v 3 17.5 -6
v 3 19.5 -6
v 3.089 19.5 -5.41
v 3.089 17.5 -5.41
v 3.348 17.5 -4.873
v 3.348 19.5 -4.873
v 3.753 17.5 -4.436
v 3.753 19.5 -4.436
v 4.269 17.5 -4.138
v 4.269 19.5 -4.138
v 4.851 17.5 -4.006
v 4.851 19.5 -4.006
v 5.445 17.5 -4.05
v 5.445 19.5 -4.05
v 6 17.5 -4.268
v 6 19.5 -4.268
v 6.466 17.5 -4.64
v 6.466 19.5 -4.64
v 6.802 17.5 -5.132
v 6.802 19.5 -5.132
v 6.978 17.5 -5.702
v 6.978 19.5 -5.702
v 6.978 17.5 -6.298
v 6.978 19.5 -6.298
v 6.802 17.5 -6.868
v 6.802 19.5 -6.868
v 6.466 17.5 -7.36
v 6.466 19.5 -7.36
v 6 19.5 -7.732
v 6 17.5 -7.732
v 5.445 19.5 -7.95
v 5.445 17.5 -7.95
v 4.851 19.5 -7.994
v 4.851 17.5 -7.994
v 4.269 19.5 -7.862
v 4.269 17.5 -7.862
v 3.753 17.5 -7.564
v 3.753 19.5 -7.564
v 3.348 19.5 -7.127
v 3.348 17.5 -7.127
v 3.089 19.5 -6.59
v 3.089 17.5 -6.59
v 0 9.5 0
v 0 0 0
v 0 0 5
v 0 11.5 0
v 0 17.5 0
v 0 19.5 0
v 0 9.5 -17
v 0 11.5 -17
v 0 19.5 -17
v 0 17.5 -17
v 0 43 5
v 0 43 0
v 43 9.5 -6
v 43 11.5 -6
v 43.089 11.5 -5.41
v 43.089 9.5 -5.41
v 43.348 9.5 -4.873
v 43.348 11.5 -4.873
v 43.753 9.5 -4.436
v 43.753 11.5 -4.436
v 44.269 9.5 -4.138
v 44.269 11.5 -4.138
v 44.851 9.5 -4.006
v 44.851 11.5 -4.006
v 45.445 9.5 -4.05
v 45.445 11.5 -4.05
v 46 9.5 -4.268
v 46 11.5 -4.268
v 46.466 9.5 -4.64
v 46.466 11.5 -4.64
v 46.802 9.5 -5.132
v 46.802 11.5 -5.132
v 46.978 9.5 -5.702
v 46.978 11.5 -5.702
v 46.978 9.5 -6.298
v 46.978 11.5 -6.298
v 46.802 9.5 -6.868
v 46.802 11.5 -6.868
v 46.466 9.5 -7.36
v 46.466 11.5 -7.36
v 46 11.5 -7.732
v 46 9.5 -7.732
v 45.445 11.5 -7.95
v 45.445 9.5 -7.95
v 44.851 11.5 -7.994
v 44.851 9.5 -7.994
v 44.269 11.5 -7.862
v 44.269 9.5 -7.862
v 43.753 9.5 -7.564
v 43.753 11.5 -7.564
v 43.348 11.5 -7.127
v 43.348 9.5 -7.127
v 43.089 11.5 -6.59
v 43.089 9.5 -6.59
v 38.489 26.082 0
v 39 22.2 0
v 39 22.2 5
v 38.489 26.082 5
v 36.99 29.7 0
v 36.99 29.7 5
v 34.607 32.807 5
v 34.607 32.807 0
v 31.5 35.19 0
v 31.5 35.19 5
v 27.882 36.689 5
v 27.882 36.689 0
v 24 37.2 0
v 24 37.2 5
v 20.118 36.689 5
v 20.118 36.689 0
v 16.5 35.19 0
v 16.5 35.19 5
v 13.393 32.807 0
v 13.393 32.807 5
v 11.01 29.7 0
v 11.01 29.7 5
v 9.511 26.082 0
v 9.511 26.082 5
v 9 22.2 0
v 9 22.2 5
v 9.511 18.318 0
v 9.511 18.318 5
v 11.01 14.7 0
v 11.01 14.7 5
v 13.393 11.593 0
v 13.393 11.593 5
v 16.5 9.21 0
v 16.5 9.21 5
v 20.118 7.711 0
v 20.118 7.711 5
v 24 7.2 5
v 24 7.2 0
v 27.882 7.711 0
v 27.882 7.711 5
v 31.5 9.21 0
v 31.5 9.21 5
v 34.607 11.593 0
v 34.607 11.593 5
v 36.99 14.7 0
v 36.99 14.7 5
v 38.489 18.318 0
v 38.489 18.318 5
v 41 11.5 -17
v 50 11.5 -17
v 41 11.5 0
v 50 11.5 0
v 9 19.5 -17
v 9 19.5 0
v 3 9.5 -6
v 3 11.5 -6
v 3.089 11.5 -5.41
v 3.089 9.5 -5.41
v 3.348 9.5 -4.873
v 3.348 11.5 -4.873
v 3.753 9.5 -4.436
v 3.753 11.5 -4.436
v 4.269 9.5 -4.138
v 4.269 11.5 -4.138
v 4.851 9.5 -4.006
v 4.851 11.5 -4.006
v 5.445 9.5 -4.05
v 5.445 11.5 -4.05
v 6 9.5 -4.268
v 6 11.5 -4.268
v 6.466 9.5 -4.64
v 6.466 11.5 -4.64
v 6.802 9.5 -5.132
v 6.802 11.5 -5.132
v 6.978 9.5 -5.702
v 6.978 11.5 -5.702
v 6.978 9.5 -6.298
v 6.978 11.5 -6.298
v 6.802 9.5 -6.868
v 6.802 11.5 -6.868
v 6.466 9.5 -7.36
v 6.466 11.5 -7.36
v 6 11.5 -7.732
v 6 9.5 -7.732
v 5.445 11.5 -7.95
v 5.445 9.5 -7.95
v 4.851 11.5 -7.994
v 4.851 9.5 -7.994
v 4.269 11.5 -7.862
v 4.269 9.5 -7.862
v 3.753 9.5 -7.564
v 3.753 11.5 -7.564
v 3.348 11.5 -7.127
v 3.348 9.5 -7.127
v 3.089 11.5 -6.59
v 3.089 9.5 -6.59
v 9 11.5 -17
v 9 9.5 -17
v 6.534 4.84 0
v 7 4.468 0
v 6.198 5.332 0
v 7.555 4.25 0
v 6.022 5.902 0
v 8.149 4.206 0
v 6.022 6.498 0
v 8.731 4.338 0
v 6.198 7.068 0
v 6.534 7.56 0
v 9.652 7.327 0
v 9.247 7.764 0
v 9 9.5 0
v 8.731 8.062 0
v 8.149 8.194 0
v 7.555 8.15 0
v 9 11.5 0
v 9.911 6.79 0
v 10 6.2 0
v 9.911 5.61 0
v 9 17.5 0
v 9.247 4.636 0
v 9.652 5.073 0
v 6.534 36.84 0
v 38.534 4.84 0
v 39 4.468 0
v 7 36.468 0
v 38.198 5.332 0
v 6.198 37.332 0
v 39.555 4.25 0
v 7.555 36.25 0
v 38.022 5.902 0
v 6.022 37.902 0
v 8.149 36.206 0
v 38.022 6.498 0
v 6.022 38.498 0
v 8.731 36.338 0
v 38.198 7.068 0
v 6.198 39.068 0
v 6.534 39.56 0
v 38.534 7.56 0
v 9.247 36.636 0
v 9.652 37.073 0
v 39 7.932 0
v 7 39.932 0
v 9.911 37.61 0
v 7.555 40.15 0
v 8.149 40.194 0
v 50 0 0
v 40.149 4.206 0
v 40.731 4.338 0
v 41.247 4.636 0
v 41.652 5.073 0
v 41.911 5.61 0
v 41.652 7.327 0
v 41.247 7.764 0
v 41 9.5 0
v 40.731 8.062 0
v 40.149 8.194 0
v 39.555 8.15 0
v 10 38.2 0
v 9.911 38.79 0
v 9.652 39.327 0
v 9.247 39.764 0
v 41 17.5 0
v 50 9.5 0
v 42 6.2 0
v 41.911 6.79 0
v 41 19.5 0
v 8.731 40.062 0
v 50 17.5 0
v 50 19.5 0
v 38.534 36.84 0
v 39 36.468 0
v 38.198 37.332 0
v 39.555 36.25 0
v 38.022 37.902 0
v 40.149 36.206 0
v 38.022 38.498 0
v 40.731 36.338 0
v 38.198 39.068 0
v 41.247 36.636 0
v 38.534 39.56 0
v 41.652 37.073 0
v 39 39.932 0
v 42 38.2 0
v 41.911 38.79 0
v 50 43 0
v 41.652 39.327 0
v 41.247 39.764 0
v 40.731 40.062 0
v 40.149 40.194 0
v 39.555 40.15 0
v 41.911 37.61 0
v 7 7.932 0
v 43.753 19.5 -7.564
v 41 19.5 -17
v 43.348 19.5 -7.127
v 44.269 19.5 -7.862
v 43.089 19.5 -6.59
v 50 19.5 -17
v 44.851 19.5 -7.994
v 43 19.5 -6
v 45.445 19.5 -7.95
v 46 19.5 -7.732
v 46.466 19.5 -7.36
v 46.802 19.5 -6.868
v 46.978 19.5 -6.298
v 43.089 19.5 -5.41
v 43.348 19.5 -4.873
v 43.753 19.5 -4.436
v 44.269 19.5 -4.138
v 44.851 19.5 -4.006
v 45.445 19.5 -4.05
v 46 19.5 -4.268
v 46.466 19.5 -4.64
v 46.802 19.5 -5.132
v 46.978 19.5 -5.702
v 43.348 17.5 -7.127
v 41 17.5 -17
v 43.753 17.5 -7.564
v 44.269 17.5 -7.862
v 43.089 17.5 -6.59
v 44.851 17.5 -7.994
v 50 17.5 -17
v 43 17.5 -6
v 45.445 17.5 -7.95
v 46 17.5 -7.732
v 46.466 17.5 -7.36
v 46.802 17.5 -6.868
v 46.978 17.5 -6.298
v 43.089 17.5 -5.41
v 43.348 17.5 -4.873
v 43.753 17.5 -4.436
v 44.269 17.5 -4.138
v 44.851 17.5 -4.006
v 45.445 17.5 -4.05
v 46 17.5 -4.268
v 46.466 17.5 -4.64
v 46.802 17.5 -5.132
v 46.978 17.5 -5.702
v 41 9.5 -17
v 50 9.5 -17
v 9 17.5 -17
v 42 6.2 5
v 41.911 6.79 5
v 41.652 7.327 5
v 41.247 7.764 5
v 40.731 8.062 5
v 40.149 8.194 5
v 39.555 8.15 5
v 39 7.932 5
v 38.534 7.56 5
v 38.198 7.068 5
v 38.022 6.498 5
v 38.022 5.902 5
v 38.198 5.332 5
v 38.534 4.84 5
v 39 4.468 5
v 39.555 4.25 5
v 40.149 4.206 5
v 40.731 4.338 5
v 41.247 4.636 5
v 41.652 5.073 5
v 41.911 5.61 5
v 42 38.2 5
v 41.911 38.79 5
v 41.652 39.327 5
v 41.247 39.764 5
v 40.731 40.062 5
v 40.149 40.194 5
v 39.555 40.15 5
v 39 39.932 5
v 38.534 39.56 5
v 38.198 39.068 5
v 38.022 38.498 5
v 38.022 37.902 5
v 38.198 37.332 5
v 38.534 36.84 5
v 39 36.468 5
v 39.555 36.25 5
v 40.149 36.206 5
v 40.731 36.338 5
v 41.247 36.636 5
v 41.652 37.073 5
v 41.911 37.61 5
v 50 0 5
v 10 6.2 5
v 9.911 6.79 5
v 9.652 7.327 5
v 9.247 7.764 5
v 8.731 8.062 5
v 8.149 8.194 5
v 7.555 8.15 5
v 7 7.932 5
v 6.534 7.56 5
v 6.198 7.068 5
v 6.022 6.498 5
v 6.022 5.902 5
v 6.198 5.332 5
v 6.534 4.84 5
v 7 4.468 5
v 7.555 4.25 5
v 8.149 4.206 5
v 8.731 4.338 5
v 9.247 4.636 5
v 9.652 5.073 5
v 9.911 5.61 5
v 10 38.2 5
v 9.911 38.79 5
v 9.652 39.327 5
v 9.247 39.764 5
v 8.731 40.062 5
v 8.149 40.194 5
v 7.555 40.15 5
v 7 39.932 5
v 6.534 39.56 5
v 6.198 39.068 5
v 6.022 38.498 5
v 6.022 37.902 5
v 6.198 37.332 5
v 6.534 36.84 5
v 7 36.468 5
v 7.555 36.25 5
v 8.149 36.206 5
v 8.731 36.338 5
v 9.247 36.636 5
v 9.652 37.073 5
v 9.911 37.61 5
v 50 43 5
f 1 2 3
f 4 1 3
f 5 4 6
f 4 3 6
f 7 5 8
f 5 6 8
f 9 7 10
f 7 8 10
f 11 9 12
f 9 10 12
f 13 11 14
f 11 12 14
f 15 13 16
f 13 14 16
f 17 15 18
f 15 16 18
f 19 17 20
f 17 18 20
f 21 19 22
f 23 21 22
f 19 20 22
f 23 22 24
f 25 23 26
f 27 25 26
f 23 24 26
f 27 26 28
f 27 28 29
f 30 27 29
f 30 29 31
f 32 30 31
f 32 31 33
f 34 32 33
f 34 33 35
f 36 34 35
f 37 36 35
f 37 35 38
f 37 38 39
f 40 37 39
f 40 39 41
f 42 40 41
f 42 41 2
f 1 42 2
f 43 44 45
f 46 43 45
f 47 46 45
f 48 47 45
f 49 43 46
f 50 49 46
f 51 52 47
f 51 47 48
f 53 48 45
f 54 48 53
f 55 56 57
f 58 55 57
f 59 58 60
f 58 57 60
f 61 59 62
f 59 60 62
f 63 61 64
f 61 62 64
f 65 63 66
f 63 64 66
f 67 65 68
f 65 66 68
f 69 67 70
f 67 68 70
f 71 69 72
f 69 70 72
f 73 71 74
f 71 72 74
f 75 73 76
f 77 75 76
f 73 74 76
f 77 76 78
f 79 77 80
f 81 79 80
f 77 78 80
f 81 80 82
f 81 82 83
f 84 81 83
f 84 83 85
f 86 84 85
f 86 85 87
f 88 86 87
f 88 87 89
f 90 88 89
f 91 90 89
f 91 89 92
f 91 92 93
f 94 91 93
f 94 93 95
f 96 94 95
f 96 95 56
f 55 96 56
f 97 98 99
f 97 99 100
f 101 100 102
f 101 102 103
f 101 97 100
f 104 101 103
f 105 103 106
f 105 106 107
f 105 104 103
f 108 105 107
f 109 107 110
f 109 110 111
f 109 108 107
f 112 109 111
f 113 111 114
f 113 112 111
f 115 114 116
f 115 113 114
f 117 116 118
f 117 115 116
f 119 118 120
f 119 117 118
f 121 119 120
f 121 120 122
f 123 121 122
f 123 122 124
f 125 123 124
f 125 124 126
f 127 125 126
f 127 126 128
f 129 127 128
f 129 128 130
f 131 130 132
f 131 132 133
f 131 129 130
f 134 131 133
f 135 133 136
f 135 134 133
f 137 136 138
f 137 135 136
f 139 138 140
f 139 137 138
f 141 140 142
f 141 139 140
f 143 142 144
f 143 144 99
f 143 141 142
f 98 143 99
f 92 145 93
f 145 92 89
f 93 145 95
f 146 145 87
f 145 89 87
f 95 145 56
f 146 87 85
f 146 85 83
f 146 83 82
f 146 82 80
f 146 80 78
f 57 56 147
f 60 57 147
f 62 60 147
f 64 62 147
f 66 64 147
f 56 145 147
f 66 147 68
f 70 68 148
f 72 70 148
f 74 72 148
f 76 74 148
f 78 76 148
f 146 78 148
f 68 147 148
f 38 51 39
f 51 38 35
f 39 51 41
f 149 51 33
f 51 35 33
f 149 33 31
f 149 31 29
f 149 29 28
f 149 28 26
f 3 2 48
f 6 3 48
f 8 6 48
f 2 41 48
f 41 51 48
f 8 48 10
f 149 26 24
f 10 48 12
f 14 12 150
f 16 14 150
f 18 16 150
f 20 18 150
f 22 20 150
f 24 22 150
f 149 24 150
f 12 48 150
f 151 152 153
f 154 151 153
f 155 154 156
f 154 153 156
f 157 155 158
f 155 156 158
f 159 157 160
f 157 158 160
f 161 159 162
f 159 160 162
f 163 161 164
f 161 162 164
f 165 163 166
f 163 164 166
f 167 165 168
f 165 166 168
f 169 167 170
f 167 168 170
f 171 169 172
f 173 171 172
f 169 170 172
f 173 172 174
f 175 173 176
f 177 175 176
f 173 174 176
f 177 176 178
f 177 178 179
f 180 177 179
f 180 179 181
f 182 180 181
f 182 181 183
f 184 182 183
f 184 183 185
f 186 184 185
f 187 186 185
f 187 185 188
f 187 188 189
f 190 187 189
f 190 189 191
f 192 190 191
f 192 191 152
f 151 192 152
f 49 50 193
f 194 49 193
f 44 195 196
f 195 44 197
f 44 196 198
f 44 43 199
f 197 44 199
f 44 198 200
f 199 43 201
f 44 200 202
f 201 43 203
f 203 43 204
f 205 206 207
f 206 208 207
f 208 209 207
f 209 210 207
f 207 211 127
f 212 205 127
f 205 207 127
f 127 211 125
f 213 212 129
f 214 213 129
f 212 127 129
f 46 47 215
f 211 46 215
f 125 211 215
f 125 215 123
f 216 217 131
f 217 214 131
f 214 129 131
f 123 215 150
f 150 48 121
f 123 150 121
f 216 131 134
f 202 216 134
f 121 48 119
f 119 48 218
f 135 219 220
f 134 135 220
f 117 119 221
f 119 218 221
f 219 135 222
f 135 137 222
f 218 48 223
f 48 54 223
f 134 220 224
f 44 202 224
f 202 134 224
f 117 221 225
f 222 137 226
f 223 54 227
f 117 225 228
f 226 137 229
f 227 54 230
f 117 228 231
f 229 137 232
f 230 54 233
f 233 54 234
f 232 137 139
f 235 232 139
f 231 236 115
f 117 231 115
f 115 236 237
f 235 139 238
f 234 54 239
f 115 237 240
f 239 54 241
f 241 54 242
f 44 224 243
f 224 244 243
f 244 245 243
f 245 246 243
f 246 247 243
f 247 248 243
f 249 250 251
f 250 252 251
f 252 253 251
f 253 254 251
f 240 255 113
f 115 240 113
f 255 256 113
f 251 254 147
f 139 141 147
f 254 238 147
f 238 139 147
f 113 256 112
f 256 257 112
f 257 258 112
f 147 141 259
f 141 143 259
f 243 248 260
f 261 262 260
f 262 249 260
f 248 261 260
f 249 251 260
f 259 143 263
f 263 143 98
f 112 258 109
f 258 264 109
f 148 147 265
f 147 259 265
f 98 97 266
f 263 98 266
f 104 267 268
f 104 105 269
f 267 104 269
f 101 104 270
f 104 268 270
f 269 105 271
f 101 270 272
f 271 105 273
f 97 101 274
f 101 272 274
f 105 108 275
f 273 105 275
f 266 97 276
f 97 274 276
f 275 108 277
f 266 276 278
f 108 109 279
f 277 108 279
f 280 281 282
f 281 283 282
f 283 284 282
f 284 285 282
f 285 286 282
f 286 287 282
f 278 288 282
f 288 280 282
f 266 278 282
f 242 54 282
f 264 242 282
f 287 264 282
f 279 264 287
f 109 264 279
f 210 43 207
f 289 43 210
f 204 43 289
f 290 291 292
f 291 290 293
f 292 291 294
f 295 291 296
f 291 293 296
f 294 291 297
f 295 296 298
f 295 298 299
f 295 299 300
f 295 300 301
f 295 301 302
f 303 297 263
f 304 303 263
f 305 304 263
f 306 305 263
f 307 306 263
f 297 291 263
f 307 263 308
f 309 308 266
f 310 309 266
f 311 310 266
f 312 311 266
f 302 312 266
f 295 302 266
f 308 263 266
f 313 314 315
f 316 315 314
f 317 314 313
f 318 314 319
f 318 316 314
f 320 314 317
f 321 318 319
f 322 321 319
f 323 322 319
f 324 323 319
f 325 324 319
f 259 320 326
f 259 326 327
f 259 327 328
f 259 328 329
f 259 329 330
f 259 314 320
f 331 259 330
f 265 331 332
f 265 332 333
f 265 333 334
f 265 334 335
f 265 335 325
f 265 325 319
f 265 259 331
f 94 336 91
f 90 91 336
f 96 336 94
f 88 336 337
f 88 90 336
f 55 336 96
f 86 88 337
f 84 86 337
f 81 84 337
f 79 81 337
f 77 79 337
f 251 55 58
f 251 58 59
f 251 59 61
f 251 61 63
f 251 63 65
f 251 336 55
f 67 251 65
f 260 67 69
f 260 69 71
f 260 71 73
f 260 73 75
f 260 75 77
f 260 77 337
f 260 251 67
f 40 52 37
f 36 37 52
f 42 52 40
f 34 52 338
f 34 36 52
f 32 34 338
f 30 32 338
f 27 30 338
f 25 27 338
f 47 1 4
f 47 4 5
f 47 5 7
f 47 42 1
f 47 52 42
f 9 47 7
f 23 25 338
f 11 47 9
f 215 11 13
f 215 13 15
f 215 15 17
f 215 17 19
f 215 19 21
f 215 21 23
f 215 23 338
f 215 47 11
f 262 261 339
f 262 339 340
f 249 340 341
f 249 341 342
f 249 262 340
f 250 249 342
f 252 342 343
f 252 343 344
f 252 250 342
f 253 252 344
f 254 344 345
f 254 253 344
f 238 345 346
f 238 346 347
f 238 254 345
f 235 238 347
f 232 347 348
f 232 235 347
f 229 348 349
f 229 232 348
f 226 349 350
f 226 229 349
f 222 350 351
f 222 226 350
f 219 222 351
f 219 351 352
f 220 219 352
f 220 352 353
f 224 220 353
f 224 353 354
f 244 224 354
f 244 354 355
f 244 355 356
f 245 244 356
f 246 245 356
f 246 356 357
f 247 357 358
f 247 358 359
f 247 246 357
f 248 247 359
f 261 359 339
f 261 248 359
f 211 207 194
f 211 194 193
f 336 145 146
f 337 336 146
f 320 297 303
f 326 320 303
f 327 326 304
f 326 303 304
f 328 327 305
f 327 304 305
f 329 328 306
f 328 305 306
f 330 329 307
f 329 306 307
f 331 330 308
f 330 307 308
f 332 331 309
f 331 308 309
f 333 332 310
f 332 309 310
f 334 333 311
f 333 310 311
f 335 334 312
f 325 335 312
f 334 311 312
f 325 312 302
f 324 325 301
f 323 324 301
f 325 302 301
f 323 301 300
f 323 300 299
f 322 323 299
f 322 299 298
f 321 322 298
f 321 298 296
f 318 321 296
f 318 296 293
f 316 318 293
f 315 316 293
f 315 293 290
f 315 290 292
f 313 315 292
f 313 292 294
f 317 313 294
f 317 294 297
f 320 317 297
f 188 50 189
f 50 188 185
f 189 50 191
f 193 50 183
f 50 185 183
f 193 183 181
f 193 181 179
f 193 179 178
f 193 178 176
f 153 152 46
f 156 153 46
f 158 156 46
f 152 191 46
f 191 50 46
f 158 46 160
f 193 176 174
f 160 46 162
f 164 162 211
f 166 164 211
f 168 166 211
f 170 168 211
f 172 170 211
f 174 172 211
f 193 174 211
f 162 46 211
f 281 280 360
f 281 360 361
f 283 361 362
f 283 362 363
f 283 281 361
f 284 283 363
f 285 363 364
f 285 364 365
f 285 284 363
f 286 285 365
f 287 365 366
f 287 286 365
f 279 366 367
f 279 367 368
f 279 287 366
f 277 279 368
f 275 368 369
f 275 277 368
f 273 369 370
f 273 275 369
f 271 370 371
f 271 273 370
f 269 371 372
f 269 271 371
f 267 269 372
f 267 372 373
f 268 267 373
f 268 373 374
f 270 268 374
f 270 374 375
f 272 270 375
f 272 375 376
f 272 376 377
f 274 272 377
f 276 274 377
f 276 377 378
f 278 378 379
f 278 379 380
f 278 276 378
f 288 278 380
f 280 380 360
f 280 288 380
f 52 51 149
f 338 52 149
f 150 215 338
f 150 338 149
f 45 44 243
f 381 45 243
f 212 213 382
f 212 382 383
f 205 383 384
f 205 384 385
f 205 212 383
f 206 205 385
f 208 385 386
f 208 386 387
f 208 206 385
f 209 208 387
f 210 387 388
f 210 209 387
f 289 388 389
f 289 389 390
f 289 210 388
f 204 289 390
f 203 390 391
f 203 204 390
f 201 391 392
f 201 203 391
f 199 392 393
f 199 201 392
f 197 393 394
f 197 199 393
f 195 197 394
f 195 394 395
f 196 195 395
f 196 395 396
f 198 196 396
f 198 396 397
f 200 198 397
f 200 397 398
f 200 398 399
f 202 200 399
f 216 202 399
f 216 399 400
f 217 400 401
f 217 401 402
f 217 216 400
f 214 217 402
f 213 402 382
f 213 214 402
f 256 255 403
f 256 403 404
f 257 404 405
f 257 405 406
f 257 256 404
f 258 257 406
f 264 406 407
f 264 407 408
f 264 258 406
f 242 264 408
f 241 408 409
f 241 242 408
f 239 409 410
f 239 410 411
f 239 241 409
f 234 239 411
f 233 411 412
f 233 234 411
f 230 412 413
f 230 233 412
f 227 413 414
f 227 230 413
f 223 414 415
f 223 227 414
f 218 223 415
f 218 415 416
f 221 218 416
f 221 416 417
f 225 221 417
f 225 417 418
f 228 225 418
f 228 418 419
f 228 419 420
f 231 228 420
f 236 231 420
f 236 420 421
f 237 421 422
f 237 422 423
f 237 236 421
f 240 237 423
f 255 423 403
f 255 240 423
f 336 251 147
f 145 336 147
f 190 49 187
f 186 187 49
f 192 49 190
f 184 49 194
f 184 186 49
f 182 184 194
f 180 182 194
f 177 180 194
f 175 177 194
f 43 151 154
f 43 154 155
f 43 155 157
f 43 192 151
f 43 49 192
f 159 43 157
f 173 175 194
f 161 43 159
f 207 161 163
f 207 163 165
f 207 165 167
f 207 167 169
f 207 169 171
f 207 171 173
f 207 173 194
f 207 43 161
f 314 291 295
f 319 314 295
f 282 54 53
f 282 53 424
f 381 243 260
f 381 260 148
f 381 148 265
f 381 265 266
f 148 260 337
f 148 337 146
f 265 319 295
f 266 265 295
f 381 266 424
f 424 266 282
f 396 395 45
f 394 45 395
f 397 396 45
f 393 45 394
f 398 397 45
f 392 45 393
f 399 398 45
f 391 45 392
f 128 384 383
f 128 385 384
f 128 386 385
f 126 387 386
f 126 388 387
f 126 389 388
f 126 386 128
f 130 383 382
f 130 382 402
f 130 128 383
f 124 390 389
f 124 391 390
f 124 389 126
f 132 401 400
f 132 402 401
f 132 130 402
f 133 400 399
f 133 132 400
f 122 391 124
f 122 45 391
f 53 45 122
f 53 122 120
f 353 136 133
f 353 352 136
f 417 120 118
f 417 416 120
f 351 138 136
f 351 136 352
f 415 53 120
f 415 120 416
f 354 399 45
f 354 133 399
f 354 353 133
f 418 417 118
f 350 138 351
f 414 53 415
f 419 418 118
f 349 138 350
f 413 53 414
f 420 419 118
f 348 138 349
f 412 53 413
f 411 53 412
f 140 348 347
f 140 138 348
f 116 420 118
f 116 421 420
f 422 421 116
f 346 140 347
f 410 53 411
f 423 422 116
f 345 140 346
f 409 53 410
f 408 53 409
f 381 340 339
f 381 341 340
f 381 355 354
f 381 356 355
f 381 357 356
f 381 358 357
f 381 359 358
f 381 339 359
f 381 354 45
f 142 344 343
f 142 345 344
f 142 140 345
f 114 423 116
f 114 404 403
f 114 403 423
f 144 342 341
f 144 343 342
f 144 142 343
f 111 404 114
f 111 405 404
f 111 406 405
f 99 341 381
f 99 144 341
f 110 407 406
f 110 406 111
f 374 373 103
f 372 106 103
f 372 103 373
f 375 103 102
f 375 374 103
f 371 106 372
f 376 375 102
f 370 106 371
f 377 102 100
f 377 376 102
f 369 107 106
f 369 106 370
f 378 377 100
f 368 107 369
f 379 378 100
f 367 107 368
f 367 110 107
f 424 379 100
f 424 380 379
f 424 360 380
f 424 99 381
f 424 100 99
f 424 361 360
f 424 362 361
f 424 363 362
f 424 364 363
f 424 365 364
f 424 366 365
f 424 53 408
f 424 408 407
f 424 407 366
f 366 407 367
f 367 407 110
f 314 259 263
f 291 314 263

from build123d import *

# Parameters (mm, degrees)
SKETCH_W     = 50
SKETCH_H     = 43
SKETCH_R     = 15
SKETCH_R_2   = 2
PAD_DEPTH    = 5
SKETCH001_W  = 9
SKETCH001_H  = 2
PAD001_DEPTH = 17
SKETCH002_R  = 2
POCKET_DEPTH = 11


with BuildPart() as part:
    # Sketch → Pad (new body)
    with BuildSketch(Plane.XY):
        with Locations((25, 21.5)):
            Rectangle(SKETCH_W, SKETCH_H)
        with Locations((24, 22.2)):
            Circle(SKETCH_R, mode=Mode.SUBTRACT)
        with Locations((40, 38.2)):
            Circle(SKETCH_R_2, mode=Mode.SUBTRACT)
        with Locations((8, 38.2)):
            Circle(SKETCH_R_2, mode=Mode.SUBTRACT)
        with Locations((8, 6.2)):
            Circle(SKETCH_R_2, mode=Mode.SUBTRACT)
        with Locations((40, 6.2)):
            Circle(SKETCH_R_2, mode=Mode.SUBTRACT)
    extrude(amount=PAD_DEPTH)

    # Sketch001 → Pad001 (join)
    with BuildSketch(Plane.XY):
        with Locations((45.5, 10.5)):
            Rectangle(SKETCH001_W, SKETCH001_H)
        with Locations((4.5, 10.5)):
            Rectangle(SKETCH001_W, SKETCH001_H)
        with Locations((4.5, 18.5)):
            Rectangle(SKETCH001_W, SKETCH001_H)
        with Locations((45.5, 18.5)):
            Rectangle(SKETCH001_W, SKETCH001_H)
    extrude(amount=-PAD001_DEPTH)

    # Sketch002 (on Face10 of Pad001) → Pocket (cut)
    with BuildSketch(Plane(origin=(0, 19.5, 0), x_dir=(-1, 0, 0), z_dir=(0, 1, 0))):
        with Locations((-5, -6)):
            Circle(SKETCH002_R)
        with Locations((-45, -6)):
            Circle(SKETCH002_R)
    extrude(amount=-POCKET_DEPTH, mode=Mode.SUBTRACT)


solid = part.part
